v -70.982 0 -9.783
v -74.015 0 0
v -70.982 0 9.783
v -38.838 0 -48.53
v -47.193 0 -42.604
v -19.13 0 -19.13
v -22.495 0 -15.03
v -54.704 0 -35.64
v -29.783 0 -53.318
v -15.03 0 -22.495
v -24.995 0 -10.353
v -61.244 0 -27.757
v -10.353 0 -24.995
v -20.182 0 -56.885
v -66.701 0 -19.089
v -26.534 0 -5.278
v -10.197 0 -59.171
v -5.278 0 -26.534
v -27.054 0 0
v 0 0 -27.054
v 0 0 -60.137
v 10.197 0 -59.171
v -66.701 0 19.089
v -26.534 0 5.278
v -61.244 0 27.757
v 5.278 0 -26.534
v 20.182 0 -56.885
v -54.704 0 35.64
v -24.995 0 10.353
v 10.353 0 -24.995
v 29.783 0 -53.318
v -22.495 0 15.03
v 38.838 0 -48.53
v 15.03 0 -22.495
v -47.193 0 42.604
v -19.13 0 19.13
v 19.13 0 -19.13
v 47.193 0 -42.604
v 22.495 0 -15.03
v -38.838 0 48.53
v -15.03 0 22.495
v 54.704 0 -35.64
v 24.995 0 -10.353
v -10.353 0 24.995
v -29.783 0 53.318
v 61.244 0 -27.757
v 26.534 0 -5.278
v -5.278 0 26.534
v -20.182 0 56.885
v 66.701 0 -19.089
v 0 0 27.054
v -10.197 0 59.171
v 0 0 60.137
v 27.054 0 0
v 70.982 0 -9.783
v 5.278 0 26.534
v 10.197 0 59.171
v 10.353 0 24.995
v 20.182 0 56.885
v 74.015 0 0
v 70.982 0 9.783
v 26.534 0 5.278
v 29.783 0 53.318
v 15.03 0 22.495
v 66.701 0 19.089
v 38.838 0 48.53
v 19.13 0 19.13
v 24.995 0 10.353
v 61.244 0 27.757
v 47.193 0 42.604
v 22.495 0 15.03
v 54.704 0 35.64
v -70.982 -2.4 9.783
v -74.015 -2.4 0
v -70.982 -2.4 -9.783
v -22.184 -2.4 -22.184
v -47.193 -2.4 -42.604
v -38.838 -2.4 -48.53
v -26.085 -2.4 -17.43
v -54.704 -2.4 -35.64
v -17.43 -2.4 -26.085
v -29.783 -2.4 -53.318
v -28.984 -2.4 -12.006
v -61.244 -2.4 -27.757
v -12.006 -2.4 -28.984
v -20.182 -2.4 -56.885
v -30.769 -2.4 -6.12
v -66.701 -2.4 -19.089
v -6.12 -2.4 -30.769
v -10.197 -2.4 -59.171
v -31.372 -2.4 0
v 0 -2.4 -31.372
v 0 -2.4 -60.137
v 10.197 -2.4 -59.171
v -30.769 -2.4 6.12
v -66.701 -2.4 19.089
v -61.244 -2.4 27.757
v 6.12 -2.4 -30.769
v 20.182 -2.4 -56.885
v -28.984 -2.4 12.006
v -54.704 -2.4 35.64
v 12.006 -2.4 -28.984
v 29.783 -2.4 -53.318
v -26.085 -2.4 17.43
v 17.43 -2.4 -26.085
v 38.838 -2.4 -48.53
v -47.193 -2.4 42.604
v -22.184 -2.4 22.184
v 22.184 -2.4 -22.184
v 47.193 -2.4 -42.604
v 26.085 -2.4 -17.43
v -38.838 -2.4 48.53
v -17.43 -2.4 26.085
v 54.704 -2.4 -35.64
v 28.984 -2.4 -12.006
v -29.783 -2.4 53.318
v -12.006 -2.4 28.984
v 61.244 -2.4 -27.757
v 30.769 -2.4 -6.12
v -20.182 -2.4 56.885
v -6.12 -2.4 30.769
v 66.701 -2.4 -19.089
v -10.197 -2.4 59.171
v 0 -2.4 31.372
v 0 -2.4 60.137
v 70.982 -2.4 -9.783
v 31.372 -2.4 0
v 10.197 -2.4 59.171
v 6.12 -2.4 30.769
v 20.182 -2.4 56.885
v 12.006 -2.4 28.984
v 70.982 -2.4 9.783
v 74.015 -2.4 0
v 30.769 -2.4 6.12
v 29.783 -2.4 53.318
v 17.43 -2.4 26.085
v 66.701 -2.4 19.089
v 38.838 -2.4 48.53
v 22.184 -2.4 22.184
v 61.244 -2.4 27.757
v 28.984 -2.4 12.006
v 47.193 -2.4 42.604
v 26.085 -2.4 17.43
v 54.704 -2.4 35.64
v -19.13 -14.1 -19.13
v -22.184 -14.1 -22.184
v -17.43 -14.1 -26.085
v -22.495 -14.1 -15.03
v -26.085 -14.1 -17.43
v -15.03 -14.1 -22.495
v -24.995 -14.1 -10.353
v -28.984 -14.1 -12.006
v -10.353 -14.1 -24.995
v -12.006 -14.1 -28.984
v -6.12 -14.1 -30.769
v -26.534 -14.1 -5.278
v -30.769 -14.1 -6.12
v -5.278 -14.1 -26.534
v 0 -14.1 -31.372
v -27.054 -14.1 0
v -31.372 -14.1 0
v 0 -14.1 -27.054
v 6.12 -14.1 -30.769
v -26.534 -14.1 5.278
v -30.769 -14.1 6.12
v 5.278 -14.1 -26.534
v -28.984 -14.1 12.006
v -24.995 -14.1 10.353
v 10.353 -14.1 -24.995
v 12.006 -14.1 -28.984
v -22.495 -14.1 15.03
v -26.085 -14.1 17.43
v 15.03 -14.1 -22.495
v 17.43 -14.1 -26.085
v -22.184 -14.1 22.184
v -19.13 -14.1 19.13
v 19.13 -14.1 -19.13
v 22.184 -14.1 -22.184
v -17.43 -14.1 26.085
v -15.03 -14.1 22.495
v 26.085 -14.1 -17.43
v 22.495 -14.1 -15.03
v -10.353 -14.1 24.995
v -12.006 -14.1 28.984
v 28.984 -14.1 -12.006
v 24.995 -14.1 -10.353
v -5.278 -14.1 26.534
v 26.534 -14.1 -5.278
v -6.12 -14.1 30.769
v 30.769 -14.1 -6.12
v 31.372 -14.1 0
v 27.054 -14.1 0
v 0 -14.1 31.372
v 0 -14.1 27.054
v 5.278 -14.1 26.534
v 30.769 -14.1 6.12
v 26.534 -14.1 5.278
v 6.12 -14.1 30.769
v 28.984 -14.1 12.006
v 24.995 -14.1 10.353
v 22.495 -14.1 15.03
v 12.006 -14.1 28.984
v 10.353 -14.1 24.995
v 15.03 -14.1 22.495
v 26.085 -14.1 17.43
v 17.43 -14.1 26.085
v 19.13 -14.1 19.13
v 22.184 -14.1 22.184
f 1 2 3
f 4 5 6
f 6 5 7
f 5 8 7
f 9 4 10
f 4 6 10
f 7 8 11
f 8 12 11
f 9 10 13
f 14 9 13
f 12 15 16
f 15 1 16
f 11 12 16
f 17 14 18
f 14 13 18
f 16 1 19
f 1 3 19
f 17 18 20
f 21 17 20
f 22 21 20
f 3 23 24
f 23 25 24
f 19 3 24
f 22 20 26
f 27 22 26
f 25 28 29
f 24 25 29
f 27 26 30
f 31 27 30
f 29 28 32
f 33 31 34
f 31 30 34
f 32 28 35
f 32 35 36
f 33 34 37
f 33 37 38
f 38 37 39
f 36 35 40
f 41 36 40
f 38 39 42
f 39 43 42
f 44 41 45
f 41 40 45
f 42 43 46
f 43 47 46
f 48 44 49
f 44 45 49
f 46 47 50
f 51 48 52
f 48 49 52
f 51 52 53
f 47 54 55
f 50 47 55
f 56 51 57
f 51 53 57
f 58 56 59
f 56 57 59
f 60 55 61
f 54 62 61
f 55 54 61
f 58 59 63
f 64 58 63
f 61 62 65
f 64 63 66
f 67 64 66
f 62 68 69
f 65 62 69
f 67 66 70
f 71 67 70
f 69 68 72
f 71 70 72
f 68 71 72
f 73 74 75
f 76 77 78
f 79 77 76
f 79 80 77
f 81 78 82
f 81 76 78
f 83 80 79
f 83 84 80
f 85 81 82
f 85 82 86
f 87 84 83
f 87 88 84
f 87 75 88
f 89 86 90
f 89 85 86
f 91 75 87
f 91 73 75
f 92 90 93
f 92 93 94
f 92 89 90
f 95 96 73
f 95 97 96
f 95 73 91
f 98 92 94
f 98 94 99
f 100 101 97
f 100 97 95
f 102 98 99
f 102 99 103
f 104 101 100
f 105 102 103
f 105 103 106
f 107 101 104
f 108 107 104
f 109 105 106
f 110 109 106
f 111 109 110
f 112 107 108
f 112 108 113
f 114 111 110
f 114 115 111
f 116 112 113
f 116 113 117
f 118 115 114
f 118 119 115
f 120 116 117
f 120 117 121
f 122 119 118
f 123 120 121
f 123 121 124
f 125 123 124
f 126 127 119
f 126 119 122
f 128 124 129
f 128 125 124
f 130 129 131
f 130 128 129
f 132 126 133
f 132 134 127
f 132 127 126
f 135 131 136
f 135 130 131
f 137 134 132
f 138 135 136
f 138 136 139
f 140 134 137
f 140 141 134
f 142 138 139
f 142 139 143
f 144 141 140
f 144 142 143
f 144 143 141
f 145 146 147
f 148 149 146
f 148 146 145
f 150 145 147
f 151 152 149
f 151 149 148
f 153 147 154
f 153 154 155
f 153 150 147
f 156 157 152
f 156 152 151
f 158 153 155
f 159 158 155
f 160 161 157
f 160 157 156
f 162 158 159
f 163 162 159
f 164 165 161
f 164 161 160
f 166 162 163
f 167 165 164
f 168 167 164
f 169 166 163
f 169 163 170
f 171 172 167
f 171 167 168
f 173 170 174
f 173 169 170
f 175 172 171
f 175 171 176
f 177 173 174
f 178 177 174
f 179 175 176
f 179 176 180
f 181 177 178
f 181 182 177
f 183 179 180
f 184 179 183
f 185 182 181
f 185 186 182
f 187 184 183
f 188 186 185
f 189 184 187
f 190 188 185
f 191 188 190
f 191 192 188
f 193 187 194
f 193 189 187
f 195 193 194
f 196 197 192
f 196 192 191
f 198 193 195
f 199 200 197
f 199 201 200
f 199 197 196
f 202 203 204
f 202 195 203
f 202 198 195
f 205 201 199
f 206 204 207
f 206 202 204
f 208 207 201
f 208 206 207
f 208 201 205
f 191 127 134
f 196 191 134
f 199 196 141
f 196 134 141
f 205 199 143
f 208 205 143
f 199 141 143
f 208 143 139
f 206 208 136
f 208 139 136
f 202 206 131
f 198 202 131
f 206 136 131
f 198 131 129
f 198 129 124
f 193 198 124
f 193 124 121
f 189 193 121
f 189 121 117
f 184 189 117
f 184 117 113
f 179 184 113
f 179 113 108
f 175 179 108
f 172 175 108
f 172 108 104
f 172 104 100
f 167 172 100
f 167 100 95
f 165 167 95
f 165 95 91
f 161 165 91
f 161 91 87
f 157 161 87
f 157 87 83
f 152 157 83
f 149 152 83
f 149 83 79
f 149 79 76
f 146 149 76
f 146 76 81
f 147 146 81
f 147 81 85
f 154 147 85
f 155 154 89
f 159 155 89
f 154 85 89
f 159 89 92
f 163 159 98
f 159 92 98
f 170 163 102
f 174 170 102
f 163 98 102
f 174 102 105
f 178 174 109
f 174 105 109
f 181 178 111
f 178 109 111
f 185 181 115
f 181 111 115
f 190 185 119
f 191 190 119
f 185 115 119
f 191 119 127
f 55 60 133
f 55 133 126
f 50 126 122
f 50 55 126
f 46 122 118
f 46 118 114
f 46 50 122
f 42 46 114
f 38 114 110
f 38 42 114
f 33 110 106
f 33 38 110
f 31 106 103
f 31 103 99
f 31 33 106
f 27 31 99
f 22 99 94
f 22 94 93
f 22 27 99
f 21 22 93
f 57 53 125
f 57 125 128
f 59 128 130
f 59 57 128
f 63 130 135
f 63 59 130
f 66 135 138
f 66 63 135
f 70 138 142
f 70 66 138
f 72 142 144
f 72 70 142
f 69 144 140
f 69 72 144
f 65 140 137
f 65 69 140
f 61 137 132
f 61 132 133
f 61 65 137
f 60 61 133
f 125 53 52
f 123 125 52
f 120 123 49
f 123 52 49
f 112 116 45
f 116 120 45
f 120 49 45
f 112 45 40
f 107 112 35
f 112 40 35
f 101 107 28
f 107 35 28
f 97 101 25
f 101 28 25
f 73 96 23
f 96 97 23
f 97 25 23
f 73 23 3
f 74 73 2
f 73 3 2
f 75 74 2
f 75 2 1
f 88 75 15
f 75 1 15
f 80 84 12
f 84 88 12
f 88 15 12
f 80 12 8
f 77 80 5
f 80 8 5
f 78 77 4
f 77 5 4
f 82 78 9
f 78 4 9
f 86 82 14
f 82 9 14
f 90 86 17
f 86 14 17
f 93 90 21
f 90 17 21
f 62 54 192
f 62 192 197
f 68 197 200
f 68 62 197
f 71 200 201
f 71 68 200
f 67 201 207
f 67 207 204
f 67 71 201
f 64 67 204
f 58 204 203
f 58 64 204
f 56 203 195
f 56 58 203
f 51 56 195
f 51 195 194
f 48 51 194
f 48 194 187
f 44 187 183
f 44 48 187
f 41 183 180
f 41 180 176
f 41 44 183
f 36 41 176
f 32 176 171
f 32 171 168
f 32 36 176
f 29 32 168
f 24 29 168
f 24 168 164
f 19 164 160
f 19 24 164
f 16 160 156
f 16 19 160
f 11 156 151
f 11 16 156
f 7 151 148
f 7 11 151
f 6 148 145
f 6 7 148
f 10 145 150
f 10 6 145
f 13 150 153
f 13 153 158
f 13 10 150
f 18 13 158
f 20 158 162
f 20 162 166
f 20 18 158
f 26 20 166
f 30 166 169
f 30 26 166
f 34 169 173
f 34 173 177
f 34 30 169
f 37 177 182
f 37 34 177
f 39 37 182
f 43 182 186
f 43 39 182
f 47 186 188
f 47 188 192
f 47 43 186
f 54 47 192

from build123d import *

# Parameters (mm, degrees)
F0_R        = 31.3722800925
F1_DEPTH    = 2.4
F0_R_2      = 27.0541255518
F2_DEPTH    = 14.1
F3_T1_DEPTH = 394.7097038856


# Not quite as in the source:
# - a fillet or chamfer that OpenCascade refuses, or shapes differently, is made with other operations: its cross-section is extruded or revolved along the edge and cut away or added


with BuildPart() as f1:
    # F0 (on Front) → F1 (new body)
    with BuildSketch(Plane.XZ):
        Polygon((76.1774070561, 60.170147568), (-76.1774070561, 60.170147568), (-76.1774070561, 34.1583490372), (-76.1774070561, -34.1583490372), (-76.1774070561, -60.170147568), (76.1774070561, -60.170147568), (76.1774070561, -34.1583490372), (76.1774070561, 34.1583490372), align=None)
        Circle(F0_R, mode=Mode.SUBTRACT)
    extrude(amount=F1_DEPTH)

    # F0 (on Front) → F2 (join)
    with BuildSketch(Plane.XZ):
        Circle(F0_R)
        Circle(F0_R_2, mode=Mode.SUBTRACT)
    extrude(amount=F2_DEPTH)

    # F3: fillet of radius 78.4619407771 on 4 edges, made by hand

    # F3_s2 → F3_t1 (cut)
    with BuildSketch(Plane.XZ.offset(-196.1548519428)):
        with BuildLine():
            ThreePointArc((2.284533721, 60.170147568), (-53.1964366675, 37.1891771794), (-76.1774070561, -18.2917932091))
            Line((-76.1774070561, -18.2917932091), (-76.1774070561, 60.170147568))
            Line((-76.1774070561, 60.170147568), (2.284533721, 60.170147568))
        make_face()
        with BuildLine():
            ThreePointArc((-2.284533721, 60.170147568), (53.1964366675, 37.1891771794), (76.1774070561, -18.2917932091))
            Line((76.1774070561, -18.2917932091), (76.1774070561, 60.170147568))
            Line((76.1774070561, 60.170147568), (-2.284533721, 60.170147568))
        make_face()
        with BuildLine():
            ThreePointArc((76.1774070561, 18.2917932091), (53.1964366675, -37.1891771794), (-2.284533721, -60.170147568))
            Line((-2.284533721, -60.170147568), (76.1774070561, -60.170147568))
            Line((76.1774070561, -60.170147568), (76.1774070561, 18.2917932091))
        make_face()
        with BuildLine():
            ThreePointArc((-76.1774070561, 18.2917932091), (-53.1964366675, -37.1891771794), (2.284533721, -60.170147568))
            Line((2.284533721, -60.170147568), (-76.1774070561, -60.170147568))
            Line((-76.1774070561, -60.170147568), (-76.1774070561, 18.2917932091))
        make_face()
    extrude(amount=F3_T1_DEPTH, mode=Mode.SUBTRACT)


solid = f1.part
